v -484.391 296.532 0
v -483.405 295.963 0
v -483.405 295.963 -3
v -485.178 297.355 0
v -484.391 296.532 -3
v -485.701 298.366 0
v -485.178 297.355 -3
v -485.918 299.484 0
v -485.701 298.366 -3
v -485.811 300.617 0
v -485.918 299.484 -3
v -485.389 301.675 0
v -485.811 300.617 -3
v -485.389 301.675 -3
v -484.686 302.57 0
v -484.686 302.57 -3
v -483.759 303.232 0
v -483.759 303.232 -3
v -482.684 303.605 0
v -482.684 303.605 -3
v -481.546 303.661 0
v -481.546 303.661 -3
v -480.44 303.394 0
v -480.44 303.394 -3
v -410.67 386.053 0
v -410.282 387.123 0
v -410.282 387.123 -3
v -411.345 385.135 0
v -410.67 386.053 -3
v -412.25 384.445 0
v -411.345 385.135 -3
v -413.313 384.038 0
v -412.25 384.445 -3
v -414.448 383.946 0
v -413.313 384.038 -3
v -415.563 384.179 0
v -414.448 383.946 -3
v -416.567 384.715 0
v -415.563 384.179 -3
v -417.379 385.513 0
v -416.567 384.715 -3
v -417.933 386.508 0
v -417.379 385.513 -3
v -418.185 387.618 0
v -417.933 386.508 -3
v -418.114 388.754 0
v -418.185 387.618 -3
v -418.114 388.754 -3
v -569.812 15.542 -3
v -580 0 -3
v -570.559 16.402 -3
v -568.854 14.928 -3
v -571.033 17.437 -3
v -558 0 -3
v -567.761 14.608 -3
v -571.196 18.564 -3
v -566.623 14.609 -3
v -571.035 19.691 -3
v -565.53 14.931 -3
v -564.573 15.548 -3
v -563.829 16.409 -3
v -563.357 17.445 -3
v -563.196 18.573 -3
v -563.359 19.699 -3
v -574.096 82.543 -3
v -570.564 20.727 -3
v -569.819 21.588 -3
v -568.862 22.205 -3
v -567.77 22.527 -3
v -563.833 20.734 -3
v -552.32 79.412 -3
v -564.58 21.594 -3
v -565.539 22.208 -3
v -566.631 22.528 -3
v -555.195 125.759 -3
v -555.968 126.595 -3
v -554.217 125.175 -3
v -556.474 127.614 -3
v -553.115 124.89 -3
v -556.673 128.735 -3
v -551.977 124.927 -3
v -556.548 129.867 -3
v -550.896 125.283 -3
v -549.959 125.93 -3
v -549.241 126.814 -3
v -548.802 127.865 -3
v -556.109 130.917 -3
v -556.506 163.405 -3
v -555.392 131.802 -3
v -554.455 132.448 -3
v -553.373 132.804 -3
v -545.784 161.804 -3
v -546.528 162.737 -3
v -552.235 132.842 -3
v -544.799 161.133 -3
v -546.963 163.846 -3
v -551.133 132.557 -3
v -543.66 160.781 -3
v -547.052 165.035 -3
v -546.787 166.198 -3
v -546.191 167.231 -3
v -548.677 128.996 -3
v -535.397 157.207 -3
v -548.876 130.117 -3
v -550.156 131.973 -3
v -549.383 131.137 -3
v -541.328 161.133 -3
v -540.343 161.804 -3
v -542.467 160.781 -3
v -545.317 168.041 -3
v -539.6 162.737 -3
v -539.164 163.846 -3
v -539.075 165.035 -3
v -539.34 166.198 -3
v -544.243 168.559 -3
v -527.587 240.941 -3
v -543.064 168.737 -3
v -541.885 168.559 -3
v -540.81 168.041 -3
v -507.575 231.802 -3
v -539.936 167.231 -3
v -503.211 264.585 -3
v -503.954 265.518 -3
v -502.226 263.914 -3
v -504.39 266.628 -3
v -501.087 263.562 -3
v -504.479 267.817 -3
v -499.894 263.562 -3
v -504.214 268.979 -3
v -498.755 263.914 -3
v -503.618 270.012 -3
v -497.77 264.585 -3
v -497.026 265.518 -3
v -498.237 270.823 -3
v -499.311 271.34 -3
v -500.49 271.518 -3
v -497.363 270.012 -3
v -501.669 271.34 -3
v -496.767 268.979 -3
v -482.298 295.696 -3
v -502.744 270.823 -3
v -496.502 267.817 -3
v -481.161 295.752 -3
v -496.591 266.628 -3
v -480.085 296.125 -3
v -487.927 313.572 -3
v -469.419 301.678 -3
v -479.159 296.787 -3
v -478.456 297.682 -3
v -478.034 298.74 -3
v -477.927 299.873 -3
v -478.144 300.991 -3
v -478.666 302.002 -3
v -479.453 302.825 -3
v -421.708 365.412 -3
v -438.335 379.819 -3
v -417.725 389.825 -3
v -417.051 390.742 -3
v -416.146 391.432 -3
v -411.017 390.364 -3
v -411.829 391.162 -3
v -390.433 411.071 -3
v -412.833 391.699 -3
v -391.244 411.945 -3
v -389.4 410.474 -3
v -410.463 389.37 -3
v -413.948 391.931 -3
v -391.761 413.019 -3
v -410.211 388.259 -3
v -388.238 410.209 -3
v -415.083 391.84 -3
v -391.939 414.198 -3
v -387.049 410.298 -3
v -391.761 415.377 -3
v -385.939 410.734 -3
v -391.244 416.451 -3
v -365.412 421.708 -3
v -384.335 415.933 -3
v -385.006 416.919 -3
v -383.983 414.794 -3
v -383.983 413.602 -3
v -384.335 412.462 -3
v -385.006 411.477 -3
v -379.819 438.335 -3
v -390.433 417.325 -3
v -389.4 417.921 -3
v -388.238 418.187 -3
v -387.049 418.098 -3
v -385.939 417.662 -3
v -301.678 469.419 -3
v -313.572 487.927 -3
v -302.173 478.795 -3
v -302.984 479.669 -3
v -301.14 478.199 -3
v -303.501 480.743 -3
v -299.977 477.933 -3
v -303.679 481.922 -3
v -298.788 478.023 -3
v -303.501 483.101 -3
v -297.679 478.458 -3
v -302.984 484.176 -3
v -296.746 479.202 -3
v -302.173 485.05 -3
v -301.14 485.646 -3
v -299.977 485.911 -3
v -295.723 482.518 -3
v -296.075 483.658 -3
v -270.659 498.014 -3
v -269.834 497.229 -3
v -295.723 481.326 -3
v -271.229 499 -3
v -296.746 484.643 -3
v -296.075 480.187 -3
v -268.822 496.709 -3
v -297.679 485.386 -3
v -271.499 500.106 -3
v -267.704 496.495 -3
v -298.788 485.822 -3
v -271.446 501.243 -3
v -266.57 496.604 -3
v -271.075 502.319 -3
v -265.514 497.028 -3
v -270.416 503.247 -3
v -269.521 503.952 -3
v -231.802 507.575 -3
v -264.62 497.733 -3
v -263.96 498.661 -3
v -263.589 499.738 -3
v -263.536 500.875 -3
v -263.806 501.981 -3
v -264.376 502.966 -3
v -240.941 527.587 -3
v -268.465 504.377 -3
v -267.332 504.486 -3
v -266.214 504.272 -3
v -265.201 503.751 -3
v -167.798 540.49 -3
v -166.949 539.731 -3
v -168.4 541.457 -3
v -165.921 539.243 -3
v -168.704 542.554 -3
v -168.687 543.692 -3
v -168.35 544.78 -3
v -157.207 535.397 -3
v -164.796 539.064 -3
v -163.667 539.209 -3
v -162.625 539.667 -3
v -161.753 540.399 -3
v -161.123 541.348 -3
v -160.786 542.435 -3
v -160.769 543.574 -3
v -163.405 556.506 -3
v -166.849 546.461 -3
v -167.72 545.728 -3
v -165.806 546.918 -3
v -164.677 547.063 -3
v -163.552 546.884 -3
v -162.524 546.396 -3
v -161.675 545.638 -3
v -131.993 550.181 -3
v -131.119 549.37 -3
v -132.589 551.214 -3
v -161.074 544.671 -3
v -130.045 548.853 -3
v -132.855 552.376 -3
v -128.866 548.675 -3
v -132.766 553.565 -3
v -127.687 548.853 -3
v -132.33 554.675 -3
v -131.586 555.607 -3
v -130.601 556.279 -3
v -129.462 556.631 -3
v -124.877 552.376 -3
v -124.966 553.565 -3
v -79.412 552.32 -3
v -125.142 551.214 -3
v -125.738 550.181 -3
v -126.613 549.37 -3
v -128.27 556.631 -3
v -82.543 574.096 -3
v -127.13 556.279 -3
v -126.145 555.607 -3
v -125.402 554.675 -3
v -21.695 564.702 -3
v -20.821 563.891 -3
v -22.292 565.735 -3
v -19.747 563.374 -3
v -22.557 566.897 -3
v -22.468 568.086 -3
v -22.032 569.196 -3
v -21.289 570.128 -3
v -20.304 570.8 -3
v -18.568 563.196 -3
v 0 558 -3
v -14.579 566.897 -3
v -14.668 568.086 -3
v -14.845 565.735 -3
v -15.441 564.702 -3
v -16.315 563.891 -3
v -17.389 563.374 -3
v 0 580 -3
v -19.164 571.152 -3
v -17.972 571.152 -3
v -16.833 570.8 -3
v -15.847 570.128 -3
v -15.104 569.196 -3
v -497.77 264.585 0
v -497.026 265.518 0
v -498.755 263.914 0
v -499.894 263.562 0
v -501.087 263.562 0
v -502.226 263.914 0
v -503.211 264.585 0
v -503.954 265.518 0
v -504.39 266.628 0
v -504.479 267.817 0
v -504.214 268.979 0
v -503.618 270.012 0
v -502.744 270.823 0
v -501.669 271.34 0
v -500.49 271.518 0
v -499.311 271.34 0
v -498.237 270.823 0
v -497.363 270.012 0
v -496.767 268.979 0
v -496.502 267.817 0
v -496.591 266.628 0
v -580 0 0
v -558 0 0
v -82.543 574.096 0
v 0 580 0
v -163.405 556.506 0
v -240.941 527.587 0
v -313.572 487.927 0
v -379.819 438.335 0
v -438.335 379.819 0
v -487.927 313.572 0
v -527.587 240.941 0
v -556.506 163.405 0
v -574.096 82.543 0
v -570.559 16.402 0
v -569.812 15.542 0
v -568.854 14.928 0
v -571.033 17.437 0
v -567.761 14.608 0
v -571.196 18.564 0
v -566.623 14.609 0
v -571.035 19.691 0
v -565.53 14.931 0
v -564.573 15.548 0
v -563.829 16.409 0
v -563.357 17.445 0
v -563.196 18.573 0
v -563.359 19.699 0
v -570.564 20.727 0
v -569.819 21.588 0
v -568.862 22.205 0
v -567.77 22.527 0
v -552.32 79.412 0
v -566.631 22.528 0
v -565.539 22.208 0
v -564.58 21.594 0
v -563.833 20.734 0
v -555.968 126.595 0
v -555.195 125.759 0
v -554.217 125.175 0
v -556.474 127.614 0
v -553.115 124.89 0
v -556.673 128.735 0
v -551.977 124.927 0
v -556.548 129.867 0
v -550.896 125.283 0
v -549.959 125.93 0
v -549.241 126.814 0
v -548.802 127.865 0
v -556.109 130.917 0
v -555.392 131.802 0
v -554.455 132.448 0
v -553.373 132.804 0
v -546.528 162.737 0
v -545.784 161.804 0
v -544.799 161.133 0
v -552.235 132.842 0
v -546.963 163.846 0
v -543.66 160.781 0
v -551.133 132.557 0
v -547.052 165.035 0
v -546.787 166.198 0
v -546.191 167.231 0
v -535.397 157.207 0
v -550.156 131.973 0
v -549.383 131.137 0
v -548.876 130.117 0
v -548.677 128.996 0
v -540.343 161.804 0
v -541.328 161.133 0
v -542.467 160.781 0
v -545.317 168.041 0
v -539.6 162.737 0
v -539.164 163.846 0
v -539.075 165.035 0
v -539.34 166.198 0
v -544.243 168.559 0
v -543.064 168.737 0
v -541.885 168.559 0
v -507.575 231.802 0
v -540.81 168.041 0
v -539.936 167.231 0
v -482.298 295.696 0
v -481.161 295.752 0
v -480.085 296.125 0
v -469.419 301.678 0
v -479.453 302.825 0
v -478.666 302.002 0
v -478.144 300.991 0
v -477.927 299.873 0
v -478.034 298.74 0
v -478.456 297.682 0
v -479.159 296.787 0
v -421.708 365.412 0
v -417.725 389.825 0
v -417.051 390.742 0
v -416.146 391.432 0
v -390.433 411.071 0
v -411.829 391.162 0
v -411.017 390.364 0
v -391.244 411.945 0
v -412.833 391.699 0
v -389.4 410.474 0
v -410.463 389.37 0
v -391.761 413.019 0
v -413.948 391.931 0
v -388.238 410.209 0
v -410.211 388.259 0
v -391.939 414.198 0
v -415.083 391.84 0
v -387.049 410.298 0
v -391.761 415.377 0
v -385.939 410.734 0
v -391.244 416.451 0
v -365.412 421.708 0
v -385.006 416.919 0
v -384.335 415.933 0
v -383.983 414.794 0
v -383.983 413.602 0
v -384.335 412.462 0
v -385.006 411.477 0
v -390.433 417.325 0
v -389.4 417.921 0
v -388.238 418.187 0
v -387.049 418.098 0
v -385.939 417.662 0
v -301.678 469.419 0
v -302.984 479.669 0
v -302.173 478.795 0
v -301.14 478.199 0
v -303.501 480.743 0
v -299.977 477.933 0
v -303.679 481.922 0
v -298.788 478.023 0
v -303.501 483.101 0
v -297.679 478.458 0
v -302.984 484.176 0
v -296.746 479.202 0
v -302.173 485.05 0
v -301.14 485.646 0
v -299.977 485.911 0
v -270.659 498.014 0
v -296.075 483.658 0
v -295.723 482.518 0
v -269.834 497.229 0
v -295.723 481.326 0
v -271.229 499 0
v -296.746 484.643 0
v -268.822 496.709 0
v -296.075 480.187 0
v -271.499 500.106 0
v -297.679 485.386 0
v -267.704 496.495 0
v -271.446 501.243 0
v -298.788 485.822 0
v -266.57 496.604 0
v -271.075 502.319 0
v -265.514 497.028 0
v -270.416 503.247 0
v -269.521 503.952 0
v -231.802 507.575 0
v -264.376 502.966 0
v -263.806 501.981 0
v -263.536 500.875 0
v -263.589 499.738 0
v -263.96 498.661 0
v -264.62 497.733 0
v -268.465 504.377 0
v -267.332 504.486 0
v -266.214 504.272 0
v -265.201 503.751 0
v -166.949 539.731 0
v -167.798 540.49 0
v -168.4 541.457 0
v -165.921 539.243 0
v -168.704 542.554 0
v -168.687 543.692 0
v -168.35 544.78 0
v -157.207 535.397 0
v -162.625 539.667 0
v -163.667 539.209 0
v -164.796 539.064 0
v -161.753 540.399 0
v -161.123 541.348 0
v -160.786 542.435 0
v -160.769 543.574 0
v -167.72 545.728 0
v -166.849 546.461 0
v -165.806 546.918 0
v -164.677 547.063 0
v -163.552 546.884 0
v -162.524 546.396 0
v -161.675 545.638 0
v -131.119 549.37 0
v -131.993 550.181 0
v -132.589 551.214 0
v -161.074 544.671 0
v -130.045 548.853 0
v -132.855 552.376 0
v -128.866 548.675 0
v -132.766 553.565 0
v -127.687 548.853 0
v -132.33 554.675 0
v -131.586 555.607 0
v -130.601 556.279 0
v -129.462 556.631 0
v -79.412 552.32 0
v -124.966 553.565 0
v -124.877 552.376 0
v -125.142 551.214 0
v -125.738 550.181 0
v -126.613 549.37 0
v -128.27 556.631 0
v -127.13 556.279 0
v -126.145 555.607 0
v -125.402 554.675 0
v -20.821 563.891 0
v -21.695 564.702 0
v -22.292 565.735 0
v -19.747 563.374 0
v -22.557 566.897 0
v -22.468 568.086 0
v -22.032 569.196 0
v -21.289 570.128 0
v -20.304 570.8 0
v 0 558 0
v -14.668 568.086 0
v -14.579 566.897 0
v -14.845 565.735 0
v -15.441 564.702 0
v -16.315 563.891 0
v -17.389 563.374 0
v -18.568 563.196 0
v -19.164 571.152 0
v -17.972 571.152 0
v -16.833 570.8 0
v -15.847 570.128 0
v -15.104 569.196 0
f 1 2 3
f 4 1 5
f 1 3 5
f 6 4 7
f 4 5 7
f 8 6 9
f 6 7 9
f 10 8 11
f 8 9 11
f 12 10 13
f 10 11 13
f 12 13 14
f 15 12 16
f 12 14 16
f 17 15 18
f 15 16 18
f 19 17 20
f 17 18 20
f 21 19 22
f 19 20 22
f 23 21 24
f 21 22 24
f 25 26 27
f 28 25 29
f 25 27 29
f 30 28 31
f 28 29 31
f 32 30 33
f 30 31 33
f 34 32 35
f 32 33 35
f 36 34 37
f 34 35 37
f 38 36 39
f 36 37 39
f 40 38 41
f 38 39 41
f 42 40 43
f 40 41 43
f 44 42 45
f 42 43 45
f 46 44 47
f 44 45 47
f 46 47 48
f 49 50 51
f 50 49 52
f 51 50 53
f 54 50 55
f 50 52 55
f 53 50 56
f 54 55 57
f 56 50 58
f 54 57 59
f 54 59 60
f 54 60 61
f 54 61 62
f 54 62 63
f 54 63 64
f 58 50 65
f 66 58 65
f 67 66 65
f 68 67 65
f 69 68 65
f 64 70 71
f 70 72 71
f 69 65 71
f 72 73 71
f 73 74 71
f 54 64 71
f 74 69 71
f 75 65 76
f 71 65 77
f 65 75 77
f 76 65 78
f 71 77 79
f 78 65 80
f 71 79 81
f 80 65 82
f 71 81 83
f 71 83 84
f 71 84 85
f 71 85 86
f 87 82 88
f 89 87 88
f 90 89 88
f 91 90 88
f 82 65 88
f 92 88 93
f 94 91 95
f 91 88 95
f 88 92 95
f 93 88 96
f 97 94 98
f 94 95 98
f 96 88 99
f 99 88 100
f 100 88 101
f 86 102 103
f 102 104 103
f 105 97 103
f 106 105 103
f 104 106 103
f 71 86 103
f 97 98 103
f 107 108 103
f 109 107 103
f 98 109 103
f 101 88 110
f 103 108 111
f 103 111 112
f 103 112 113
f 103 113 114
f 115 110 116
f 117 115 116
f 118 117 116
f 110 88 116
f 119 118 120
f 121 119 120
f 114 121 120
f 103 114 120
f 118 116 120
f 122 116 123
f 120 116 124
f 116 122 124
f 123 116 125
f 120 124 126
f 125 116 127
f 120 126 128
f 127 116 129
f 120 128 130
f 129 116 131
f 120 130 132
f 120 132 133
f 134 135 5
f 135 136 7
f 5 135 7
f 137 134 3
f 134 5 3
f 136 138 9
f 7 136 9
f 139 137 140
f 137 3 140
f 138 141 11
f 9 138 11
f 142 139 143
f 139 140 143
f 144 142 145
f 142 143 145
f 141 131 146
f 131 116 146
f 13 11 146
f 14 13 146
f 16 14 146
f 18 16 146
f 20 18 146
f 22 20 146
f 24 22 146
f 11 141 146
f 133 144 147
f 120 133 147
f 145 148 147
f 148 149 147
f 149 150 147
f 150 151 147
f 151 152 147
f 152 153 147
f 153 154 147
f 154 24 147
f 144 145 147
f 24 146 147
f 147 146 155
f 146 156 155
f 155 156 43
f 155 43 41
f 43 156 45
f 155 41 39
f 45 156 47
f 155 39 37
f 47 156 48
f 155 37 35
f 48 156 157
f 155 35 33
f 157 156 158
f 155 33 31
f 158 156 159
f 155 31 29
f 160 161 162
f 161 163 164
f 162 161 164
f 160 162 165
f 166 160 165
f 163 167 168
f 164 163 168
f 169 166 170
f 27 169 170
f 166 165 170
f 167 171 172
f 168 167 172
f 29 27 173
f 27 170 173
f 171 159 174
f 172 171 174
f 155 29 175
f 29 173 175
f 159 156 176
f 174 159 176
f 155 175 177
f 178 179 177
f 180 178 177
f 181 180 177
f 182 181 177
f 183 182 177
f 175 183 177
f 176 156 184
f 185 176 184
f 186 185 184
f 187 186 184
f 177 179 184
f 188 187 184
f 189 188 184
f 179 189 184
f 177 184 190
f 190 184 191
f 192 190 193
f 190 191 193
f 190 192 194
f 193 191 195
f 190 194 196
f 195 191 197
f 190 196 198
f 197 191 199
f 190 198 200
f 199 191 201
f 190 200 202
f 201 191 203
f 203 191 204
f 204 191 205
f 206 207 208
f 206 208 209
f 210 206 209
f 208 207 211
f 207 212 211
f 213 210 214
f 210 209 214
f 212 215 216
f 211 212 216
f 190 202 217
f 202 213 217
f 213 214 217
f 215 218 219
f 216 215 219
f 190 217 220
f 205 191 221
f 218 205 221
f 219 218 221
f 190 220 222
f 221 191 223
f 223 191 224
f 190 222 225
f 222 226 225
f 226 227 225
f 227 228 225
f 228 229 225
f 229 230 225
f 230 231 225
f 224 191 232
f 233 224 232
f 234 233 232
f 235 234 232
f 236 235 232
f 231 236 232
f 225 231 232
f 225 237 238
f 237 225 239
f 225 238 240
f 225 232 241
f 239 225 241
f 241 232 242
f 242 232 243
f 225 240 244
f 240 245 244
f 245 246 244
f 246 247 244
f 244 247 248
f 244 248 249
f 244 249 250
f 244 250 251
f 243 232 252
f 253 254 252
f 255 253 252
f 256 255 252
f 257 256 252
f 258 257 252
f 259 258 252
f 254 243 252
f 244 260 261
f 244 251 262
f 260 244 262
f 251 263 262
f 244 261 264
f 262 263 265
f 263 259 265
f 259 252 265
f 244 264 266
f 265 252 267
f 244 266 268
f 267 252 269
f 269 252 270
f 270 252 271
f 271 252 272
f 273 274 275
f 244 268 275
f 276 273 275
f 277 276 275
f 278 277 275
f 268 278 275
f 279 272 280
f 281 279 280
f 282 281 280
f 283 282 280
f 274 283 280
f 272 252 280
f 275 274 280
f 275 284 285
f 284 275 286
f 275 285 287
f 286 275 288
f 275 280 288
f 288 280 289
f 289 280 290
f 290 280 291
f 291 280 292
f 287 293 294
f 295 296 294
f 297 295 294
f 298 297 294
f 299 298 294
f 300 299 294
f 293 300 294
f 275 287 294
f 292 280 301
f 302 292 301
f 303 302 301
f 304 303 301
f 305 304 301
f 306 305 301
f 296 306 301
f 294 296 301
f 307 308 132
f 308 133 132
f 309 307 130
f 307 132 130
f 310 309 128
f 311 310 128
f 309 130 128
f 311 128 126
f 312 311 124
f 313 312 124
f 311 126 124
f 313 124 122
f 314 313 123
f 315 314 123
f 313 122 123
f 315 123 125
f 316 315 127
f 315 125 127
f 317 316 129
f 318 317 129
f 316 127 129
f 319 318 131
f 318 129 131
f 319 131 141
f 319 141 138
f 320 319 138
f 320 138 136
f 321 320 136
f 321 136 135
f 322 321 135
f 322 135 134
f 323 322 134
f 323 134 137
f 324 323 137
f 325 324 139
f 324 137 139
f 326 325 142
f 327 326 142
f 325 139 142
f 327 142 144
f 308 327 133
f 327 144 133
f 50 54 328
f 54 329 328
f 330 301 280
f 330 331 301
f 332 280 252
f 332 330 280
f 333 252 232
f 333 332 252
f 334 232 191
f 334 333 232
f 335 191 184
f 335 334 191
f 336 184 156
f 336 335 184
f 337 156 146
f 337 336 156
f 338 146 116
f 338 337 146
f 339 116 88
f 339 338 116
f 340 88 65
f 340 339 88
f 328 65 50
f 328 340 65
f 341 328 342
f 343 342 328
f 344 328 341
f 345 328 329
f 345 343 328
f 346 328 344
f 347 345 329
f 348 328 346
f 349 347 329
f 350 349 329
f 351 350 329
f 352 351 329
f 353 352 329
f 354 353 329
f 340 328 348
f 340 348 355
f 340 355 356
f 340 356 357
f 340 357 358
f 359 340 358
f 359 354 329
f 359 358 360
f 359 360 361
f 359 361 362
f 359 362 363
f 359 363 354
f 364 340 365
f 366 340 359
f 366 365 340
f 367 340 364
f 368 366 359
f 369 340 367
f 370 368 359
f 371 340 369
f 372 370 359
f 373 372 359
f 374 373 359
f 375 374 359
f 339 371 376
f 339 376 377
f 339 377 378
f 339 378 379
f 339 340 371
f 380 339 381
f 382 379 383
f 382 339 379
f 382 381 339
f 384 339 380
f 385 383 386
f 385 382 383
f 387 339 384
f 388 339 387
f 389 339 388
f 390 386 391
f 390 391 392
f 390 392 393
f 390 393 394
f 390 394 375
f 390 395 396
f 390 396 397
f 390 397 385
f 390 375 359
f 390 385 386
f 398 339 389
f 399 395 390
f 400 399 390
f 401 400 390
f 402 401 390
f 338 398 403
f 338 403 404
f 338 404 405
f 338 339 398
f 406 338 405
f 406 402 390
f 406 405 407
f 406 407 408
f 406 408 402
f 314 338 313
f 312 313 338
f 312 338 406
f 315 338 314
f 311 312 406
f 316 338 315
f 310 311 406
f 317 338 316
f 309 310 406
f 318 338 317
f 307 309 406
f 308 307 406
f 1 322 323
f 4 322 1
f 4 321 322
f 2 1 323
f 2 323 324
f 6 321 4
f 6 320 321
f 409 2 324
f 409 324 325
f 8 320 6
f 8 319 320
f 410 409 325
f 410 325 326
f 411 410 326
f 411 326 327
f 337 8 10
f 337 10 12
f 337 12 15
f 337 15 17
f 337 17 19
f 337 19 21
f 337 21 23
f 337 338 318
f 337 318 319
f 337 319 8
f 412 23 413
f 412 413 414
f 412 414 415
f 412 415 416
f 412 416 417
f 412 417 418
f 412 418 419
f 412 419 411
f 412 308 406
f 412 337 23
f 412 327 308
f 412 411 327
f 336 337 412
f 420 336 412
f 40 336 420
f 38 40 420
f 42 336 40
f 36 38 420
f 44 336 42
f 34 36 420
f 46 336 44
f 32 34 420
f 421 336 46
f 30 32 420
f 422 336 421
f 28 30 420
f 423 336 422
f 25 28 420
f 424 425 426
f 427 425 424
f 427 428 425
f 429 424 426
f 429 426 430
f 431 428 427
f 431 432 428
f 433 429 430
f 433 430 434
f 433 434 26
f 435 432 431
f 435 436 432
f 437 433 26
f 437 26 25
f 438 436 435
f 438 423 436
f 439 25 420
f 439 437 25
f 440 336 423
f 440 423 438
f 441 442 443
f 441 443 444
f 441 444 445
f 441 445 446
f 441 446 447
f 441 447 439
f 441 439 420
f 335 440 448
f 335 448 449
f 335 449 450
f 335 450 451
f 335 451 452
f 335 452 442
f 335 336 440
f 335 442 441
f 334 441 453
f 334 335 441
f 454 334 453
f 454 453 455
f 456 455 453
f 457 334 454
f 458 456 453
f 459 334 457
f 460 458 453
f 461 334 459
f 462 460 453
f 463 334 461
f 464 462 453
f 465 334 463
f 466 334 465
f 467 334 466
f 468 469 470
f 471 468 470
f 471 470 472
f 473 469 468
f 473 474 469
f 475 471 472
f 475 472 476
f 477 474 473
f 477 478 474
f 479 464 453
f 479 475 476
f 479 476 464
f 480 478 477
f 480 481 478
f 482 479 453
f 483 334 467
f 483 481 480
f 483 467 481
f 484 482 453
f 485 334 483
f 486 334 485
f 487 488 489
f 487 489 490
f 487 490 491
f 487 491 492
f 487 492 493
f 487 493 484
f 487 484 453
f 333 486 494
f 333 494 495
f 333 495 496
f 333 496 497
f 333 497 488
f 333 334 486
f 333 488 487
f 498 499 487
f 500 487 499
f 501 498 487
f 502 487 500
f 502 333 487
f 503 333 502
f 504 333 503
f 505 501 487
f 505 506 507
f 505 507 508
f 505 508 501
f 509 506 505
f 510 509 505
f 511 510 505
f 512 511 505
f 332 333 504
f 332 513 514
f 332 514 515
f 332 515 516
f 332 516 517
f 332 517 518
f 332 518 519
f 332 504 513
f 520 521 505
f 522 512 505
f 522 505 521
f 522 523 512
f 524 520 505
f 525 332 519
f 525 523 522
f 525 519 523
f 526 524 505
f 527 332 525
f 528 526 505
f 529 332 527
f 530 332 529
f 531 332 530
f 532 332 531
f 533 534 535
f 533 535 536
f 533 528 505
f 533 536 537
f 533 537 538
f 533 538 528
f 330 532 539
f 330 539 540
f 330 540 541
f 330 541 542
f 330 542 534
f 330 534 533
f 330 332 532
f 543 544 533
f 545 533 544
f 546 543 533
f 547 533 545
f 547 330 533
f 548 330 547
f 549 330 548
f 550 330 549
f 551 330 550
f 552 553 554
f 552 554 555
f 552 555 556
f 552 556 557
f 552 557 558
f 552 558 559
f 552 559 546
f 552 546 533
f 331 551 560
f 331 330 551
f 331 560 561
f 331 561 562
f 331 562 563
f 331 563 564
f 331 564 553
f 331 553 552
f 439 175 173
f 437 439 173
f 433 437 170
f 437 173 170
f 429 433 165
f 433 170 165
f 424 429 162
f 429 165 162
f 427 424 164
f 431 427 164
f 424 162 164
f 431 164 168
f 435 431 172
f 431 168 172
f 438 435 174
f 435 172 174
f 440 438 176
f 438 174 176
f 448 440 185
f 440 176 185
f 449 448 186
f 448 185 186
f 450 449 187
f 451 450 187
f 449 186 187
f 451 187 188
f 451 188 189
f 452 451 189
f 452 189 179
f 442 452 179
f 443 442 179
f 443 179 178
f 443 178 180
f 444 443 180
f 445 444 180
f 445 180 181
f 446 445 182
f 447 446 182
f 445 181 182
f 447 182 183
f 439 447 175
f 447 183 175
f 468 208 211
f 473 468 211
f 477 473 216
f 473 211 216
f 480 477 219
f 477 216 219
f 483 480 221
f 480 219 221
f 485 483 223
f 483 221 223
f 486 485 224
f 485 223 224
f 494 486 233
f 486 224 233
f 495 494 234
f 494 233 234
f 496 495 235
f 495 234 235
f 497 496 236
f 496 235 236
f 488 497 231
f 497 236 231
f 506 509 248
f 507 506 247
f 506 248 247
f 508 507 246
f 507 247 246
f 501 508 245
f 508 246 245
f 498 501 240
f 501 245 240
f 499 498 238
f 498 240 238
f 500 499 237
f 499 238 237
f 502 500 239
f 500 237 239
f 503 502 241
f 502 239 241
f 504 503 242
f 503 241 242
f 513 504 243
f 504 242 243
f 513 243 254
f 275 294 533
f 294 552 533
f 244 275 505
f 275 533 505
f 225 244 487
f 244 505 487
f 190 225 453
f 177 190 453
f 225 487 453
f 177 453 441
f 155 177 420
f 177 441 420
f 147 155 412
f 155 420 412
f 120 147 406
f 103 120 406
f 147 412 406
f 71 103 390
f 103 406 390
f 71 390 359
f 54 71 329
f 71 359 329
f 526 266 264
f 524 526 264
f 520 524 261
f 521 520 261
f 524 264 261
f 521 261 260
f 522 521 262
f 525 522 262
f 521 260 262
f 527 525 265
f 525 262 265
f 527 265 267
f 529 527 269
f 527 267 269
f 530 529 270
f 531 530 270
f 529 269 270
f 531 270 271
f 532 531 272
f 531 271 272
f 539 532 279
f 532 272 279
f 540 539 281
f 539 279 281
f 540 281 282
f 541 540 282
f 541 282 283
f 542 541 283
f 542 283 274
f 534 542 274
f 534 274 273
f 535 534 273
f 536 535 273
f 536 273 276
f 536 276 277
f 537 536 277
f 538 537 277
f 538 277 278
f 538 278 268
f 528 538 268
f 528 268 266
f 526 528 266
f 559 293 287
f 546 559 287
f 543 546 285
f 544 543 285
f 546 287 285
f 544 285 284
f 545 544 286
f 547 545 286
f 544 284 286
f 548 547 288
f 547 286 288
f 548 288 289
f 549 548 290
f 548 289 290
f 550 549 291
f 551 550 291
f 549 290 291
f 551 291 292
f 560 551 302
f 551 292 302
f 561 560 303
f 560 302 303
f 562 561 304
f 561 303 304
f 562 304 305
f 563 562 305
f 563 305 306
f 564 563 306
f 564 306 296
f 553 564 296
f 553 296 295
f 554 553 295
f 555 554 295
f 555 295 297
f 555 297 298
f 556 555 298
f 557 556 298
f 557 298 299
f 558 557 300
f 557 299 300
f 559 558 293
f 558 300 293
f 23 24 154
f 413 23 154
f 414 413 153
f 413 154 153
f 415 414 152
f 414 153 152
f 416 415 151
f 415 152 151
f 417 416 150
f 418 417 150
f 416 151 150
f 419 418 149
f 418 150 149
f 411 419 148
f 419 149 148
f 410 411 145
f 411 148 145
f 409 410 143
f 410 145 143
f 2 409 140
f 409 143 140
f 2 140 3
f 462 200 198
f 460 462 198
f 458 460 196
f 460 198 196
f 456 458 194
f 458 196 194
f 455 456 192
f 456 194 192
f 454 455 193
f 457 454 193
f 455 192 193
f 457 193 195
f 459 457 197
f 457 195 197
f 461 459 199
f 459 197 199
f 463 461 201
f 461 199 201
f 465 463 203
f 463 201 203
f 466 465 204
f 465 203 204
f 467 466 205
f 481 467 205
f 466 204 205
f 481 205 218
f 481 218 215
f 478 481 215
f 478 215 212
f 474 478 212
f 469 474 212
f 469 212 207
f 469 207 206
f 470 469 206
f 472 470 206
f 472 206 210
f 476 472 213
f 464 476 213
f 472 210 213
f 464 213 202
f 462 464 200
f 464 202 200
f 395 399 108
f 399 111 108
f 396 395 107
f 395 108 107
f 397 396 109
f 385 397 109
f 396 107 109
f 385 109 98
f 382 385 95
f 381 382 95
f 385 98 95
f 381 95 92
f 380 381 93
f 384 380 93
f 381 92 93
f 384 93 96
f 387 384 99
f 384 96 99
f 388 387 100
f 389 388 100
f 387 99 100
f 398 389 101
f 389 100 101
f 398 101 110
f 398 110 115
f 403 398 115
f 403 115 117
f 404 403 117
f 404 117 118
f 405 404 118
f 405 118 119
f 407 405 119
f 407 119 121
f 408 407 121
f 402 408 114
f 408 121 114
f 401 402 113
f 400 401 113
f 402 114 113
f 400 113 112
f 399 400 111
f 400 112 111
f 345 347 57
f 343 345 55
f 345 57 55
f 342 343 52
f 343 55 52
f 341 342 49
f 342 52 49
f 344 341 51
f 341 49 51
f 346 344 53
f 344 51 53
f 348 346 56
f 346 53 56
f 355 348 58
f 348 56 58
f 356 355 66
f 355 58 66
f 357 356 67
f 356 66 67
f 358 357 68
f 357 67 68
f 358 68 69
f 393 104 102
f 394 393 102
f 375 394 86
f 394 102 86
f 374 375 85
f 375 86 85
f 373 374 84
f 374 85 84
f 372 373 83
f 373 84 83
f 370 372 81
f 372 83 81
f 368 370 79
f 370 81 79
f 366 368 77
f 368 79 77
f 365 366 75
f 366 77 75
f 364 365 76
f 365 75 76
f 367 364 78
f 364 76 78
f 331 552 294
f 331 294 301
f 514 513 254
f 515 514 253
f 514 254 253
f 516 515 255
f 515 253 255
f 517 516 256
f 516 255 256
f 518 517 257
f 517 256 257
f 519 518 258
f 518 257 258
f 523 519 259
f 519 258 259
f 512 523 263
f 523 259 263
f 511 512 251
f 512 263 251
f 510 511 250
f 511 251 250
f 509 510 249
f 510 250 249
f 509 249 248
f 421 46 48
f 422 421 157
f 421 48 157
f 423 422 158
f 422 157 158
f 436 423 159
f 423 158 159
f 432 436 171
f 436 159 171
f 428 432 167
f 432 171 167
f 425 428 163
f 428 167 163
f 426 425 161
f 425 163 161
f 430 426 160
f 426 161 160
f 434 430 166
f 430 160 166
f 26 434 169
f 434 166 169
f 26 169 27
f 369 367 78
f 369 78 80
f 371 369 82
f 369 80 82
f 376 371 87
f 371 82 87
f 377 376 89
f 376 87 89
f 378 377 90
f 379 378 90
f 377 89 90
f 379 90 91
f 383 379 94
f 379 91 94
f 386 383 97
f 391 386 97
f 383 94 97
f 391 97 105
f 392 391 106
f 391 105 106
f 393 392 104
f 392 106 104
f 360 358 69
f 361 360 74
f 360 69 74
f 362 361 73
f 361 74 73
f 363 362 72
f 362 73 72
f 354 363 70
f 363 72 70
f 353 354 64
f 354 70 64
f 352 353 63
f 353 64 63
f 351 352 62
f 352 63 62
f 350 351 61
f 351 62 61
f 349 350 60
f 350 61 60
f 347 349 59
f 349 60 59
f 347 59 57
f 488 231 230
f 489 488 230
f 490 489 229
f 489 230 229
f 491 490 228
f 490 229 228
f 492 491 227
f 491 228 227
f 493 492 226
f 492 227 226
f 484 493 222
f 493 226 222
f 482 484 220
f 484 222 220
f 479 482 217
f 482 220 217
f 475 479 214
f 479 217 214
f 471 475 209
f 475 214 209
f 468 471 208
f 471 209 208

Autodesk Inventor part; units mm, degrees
ref_plane "YZ Plane" through (0, 0, 0) normal (1, 0, 0) x (0, 1, 0)
ref_plane "XZ Plane" through (0, 0, 0) normal (0, 1, 0) x (-1, 0, 0)
ref_plane "XY Plane" through (0, 0, 0) normal (0, 0, 1) x (1, 0, 0)
sketch "Sketch1" plane through (0, 0, 0) normal (0, 0, 1) x (1, 0, 0)
  circle A0 centre (0, 0) radius 558
  circle A1 centre (0, 0) radius 580
  line L0 (0, 0) -> (-580, 0)
  line L1 (0, 0) -> (0, 580) construction
  line L2 (0, 0) -> (0, 580)
  circle A2 centre (0, 0) radius 100
  line L3 (197.082, 197.082) -> (278.716, 0)
  line L4 (278.716, 0) -> (197.082, -197.082)
  line L5 (197.082, -197.082) -> (0, -278.716)
  line L6 (0, -278.716) -> (-197.082, -197.082)
  line L7 (-197.082, -197.082) -> (-278.716, 0)
  line L8 (-278.716, 0) -> (-197.082, 197.082)
  line L9 (-197.082, 197.082) -> (0, 278.716)
  line L10 (0, 278.716) -> (197.082, 197.082)
  point P0 (-558, 0)
  point P1 (0, 558)
  point P2 (-100, 0)
  point P3 (0, 100)
  point P4 (0, 278.716)
  point P5 (-278.716, 0)
  dimension "d30" = 90
  dimension "d31" = 1160
  dimension "d32" = 1116
  dimension "d65" = 90
  dimension "d66" = 200
  dimension "d91" = 515
extrude "Plate1" add sketch "Sketch1" against normal blind 3 contours A0 L0 A1 L2 picked at (-572.0249, 22.0563)
sketch "Sketch2" plane through (0, 0, 0) normal (0, 0, 1) x (1, 0, 0)
  circle A0 centre (0, 0) radius 567.5
  arc A1 (0, 580) -> (-580, 0) centre (0, 0) ccw projected
  line L0 (0, 0) -> (0, 580) construction
  line L1 (0, 0) -> (-18.5681, 567.1962) construction
  line L2 (-128.8658, 552.6752) -> (0, 0) construction
  line L3 (0, 0) -> (0, 567.5) construction
  line L4 (0, 0) -> (18.5681, 567.1962) construction
  line L5 (0, 0) -> (128.8658, 552.6752) construction
  line L6 (0, 0) -> (-164.7366, 543.0636) construction
  line L7 (0, 0) -> (-267.5176, 500.4903) construction
  dimension "d34" = 1135
  dimension "d35" = 1.875
  dimension "d36" = 11.25
  dimension "d44" = 1.875
  dimension "d45" = 11.25
  dimension "d49" = 3.75
  dimension "d50" = 11.25
hole "Hole1" at (-18.5681, 567.1962, 0) at (-128.8658, 552.6752, 0) at (128.8658, 552.6752, 0) at (18.5681, 567.1962, 0) at (-164.7366, 543.0636, 0) at (-267.5176, 500.4903, 0) direction (0, 0, -1) diameter 8 end through all
pattern_circular "Circular Pattern1" count 4 over 90 about axis through (0, 0, -10) along (0, 0, 1) of "Hole1"
equation "\"d31\" = Колесо_диам1_ручья_внеш"
equation "\"d91\" = Барабан_размер_по_плоскостям"
equation "\"d44\" = d35"
equation "\"d45\" = d36"
equation "\"d49\" = 2 * d35"
equation "\"d50\" = d36"
equation "\"d42\" = Thickness"
equation "\"d15\" = Thickness"
equation "\"BendRadius\" = Thickness"
equation "\"BendReliefWidth\" = Thickness"
equation "\"BendReliefDepth\" = 0.5 * Thickness"
equation "\"CornerReliefSize\" = 4 * Thickness"
equation "\"MinimumRemnant\" = 2 * Thickness"
equation "\"TransitionRadius\" = BendRadius"
equation "\"JacobiRadiusSize\" = BendRadius"
equation "\"GapSize\" = Thickness"
equation "\"Колесо_диам1_ручья_внеш\" = 1160"
equation "\"Барабан_размер_по_плоскостям\" = 515"
equation "\"Thickness\" = 3"
properties part number "DMF 2.1 01 43 Gear rim 3_CPY" material "Stainless Steel"
